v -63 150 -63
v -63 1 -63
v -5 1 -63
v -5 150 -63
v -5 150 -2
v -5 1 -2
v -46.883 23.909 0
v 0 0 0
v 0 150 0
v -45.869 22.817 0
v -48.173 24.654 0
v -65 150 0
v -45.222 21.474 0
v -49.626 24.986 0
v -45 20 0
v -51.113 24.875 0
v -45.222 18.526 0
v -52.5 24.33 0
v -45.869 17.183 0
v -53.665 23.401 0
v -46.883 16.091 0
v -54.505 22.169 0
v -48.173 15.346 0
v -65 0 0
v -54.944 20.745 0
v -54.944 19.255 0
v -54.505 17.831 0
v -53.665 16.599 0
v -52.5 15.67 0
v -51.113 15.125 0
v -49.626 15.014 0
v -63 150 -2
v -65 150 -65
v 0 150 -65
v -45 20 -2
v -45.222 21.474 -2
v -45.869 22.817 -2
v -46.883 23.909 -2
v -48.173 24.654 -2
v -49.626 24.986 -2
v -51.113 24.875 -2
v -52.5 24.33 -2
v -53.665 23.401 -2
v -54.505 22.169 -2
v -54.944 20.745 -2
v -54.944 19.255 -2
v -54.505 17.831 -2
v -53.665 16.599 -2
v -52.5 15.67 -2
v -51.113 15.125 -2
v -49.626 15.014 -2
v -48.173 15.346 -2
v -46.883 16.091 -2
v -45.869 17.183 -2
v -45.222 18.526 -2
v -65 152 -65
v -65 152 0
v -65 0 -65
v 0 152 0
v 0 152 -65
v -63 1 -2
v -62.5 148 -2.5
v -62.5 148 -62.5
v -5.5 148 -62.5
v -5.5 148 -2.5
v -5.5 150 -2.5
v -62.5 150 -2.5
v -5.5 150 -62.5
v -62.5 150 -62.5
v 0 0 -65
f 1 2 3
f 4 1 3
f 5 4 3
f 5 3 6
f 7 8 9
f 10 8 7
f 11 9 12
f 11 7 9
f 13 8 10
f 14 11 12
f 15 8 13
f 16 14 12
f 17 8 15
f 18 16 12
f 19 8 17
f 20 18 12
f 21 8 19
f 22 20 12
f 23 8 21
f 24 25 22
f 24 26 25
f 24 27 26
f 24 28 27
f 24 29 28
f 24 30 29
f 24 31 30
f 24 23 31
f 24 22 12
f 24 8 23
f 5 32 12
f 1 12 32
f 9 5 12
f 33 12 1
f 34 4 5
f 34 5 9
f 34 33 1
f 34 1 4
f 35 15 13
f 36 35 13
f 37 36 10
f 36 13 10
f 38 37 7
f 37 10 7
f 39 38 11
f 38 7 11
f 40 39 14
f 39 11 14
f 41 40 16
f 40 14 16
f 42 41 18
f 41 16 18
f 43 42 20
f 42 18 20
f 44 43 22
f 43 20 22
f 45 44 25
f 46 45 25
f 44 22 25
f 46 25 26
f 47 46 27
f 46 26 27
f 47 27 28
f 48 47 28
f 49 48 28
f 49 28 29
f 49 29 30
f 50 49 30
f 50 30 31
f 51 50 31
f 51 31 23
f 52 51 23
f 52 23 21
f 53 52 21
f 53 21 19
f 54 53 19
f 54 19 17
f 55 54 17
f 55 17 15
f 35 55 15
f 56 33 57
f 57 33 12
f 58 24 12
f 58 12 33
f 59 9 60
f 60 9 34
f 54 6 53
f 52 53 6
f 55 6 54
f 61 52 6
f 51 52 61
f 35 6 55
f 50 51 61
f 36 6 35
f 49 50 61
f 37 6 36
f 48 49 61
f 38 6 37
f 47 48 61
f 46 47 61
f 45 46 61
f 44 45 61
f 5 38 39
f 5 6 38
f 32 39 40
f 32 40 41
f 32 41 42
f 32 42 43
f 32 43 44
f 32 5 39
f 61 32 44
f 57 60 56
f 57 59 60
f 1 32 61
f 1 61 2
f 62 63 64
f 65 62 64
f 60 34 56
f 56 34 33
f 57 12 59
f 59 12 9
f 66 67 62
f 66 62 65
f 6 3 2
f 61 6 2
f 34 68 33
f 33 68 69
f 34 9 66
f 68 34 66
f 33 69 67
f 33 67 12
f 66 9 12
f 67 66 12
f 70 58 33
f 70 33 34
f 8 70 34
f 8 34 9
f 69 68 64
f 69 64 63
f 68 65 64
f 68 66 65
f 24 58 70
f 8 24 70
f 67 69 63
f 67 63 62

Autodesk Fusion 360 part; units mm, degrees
sketch "Boceto2" plane through (0, 0, 0) normal (0, 1, 0) x (1, 0, 0)
  line L0 (0, 0) -> (-65, 0)
  line L1 (-65, 0) -> (-65, 65)
  line L2 (-65, 65) -> (0, 65)
  line L3 (0, 65) -> (0, 0)
  dimension "d3" = 65
  dimension "d4" = 65
extrude "Extruir3" add sketch "Boceto2" along normal blind 150 makes body 1
sketch "Boceto4" plane through (0, 150, 0) normal (0, 1, 0) x (-1, 0, 0)
  line L0 (0, -65) -> (65, -65)
  line L1 (65, -65) -> (65, 0)
  line L2 (65, 0) -> (0, 0)
  line L3 (0, 0) -> (0, -65)
  line L4 (5, -2) -> (63, -2)
  line L5 (63, -2) -> (63, -63)
  line L6 (63, -63) -> (5, -63)
  line L7 (5, -63) -> (5, -2)
  dimension "d13" = 5
  dimension "d14" = 2
  dimension "d15" = 2
  dimension "d16" = 2
extrude "Extruir5" cut sketch "Boceto4" against normal blind 149 contours L4 L5 L6 L7 bodies 1
sketch "Boceto5" plane through (0, 150, 0) normal (0, 1, 0) x (-1, 0, 0)
  line L0 (63, -2) -> (63, -63)
  line L1 (63, -63) -> (5, -63)
  line L2 (5, -63) -> (5, -2)
  line L3 (5, -2) -> (63, -2)
  line L4 (0, -65) -> (65, -65)
  line L5 (65, -65) -> (65, 0)
  line L6 (65, 0) -> (0, 0)
  line L7 (0, 0) -> (0, -65)
  line L8 (0, 0) -> (65, 0)
  line L9 (65, 0) -> (65, -65)
  line L10 (65, -65) -> (0, -65)
  line L11 (0, -65) -> (0, 0)
extrude "Extruir6" add sketch "Boceto5" along normal blind 2 separate body contours L0 L1 L2 L3 | L4 L5 L6 L7 L8 L9 L10 L11 makes body 2
sketch "Boceto6" plane through (0, 150, 0) normal (0, -1, 0) x (1, 0, 0)
  line L0 (-65, -65) -> (0, -65)
  line L1 (0, -65) -> (0, 0)
  line L2 (0, 0) -> (-65, 0)
  line L3 (-65, 0) -> (-65, -65)
  line L4 (-5.5, -62.5) -> (-62.5, -62.5)
  line L5 (-62.5, -62.5) -> (-62.5, -2.5)
  line L6 (-62.5, -2.5) -> (-5.5, -2.5)
  line L7 (-5.5, -2.5) -> (-5.5, -62.5)
  dimension "d21" = 5.5
  dimension "d22" = 2.5
  dimension "d23" = 2.5
  dimension "d24" = 2.5
extrude "Extruir7" add sketch "Boceto6" along normal blind 2 contours L4 L5 L6 L7 bodies 2
sketch "Boceto7" plane through (0, 0, 0) normal (0, 0, 1) x (1, 0, 0)
  line L0 (-65, 0) -> (0, 0)
  line L1 (0, 0) -> (0, 150)
  line L2 (0, 150) -> (-65, 150)
  line L3 (-65, 150) -> (-65, 0)
  circle A0 centre (-50, 20) radius 5
  dimension "d27" = 10
extrude "Extruir8" cut sketch "Boceto7" against normal up to surface (2 mm away) contours A0 bodies 1
sketch "Boceto8" plane through (0, 152, 0) normal (0, 1, 0) x (-1, 0, 0)
  line L0 (0, -65) -> (65, -65)
  line L1 (65, -65) -> (65, 0)
  line L2 (65, 0) -> (0, 0)
  line L3 (0, 0) -> (0, -65)
  circle A0 centre (25, -25) radius 2.5
  circle A1 centre (25, -32.5) radius 2.5
  circle A2 centre (25, -40) radius 2.5
  dimension "d31" = 5
  dimension "d32" = 5
  dimension "d33" = 5
  dimension "d34" = 25
  dimension "d35" = 25
  dimension "d36" = 25
  dimension "d37" = 25
  dimension "d38" = 32.5
  dimension "d39" = 25
